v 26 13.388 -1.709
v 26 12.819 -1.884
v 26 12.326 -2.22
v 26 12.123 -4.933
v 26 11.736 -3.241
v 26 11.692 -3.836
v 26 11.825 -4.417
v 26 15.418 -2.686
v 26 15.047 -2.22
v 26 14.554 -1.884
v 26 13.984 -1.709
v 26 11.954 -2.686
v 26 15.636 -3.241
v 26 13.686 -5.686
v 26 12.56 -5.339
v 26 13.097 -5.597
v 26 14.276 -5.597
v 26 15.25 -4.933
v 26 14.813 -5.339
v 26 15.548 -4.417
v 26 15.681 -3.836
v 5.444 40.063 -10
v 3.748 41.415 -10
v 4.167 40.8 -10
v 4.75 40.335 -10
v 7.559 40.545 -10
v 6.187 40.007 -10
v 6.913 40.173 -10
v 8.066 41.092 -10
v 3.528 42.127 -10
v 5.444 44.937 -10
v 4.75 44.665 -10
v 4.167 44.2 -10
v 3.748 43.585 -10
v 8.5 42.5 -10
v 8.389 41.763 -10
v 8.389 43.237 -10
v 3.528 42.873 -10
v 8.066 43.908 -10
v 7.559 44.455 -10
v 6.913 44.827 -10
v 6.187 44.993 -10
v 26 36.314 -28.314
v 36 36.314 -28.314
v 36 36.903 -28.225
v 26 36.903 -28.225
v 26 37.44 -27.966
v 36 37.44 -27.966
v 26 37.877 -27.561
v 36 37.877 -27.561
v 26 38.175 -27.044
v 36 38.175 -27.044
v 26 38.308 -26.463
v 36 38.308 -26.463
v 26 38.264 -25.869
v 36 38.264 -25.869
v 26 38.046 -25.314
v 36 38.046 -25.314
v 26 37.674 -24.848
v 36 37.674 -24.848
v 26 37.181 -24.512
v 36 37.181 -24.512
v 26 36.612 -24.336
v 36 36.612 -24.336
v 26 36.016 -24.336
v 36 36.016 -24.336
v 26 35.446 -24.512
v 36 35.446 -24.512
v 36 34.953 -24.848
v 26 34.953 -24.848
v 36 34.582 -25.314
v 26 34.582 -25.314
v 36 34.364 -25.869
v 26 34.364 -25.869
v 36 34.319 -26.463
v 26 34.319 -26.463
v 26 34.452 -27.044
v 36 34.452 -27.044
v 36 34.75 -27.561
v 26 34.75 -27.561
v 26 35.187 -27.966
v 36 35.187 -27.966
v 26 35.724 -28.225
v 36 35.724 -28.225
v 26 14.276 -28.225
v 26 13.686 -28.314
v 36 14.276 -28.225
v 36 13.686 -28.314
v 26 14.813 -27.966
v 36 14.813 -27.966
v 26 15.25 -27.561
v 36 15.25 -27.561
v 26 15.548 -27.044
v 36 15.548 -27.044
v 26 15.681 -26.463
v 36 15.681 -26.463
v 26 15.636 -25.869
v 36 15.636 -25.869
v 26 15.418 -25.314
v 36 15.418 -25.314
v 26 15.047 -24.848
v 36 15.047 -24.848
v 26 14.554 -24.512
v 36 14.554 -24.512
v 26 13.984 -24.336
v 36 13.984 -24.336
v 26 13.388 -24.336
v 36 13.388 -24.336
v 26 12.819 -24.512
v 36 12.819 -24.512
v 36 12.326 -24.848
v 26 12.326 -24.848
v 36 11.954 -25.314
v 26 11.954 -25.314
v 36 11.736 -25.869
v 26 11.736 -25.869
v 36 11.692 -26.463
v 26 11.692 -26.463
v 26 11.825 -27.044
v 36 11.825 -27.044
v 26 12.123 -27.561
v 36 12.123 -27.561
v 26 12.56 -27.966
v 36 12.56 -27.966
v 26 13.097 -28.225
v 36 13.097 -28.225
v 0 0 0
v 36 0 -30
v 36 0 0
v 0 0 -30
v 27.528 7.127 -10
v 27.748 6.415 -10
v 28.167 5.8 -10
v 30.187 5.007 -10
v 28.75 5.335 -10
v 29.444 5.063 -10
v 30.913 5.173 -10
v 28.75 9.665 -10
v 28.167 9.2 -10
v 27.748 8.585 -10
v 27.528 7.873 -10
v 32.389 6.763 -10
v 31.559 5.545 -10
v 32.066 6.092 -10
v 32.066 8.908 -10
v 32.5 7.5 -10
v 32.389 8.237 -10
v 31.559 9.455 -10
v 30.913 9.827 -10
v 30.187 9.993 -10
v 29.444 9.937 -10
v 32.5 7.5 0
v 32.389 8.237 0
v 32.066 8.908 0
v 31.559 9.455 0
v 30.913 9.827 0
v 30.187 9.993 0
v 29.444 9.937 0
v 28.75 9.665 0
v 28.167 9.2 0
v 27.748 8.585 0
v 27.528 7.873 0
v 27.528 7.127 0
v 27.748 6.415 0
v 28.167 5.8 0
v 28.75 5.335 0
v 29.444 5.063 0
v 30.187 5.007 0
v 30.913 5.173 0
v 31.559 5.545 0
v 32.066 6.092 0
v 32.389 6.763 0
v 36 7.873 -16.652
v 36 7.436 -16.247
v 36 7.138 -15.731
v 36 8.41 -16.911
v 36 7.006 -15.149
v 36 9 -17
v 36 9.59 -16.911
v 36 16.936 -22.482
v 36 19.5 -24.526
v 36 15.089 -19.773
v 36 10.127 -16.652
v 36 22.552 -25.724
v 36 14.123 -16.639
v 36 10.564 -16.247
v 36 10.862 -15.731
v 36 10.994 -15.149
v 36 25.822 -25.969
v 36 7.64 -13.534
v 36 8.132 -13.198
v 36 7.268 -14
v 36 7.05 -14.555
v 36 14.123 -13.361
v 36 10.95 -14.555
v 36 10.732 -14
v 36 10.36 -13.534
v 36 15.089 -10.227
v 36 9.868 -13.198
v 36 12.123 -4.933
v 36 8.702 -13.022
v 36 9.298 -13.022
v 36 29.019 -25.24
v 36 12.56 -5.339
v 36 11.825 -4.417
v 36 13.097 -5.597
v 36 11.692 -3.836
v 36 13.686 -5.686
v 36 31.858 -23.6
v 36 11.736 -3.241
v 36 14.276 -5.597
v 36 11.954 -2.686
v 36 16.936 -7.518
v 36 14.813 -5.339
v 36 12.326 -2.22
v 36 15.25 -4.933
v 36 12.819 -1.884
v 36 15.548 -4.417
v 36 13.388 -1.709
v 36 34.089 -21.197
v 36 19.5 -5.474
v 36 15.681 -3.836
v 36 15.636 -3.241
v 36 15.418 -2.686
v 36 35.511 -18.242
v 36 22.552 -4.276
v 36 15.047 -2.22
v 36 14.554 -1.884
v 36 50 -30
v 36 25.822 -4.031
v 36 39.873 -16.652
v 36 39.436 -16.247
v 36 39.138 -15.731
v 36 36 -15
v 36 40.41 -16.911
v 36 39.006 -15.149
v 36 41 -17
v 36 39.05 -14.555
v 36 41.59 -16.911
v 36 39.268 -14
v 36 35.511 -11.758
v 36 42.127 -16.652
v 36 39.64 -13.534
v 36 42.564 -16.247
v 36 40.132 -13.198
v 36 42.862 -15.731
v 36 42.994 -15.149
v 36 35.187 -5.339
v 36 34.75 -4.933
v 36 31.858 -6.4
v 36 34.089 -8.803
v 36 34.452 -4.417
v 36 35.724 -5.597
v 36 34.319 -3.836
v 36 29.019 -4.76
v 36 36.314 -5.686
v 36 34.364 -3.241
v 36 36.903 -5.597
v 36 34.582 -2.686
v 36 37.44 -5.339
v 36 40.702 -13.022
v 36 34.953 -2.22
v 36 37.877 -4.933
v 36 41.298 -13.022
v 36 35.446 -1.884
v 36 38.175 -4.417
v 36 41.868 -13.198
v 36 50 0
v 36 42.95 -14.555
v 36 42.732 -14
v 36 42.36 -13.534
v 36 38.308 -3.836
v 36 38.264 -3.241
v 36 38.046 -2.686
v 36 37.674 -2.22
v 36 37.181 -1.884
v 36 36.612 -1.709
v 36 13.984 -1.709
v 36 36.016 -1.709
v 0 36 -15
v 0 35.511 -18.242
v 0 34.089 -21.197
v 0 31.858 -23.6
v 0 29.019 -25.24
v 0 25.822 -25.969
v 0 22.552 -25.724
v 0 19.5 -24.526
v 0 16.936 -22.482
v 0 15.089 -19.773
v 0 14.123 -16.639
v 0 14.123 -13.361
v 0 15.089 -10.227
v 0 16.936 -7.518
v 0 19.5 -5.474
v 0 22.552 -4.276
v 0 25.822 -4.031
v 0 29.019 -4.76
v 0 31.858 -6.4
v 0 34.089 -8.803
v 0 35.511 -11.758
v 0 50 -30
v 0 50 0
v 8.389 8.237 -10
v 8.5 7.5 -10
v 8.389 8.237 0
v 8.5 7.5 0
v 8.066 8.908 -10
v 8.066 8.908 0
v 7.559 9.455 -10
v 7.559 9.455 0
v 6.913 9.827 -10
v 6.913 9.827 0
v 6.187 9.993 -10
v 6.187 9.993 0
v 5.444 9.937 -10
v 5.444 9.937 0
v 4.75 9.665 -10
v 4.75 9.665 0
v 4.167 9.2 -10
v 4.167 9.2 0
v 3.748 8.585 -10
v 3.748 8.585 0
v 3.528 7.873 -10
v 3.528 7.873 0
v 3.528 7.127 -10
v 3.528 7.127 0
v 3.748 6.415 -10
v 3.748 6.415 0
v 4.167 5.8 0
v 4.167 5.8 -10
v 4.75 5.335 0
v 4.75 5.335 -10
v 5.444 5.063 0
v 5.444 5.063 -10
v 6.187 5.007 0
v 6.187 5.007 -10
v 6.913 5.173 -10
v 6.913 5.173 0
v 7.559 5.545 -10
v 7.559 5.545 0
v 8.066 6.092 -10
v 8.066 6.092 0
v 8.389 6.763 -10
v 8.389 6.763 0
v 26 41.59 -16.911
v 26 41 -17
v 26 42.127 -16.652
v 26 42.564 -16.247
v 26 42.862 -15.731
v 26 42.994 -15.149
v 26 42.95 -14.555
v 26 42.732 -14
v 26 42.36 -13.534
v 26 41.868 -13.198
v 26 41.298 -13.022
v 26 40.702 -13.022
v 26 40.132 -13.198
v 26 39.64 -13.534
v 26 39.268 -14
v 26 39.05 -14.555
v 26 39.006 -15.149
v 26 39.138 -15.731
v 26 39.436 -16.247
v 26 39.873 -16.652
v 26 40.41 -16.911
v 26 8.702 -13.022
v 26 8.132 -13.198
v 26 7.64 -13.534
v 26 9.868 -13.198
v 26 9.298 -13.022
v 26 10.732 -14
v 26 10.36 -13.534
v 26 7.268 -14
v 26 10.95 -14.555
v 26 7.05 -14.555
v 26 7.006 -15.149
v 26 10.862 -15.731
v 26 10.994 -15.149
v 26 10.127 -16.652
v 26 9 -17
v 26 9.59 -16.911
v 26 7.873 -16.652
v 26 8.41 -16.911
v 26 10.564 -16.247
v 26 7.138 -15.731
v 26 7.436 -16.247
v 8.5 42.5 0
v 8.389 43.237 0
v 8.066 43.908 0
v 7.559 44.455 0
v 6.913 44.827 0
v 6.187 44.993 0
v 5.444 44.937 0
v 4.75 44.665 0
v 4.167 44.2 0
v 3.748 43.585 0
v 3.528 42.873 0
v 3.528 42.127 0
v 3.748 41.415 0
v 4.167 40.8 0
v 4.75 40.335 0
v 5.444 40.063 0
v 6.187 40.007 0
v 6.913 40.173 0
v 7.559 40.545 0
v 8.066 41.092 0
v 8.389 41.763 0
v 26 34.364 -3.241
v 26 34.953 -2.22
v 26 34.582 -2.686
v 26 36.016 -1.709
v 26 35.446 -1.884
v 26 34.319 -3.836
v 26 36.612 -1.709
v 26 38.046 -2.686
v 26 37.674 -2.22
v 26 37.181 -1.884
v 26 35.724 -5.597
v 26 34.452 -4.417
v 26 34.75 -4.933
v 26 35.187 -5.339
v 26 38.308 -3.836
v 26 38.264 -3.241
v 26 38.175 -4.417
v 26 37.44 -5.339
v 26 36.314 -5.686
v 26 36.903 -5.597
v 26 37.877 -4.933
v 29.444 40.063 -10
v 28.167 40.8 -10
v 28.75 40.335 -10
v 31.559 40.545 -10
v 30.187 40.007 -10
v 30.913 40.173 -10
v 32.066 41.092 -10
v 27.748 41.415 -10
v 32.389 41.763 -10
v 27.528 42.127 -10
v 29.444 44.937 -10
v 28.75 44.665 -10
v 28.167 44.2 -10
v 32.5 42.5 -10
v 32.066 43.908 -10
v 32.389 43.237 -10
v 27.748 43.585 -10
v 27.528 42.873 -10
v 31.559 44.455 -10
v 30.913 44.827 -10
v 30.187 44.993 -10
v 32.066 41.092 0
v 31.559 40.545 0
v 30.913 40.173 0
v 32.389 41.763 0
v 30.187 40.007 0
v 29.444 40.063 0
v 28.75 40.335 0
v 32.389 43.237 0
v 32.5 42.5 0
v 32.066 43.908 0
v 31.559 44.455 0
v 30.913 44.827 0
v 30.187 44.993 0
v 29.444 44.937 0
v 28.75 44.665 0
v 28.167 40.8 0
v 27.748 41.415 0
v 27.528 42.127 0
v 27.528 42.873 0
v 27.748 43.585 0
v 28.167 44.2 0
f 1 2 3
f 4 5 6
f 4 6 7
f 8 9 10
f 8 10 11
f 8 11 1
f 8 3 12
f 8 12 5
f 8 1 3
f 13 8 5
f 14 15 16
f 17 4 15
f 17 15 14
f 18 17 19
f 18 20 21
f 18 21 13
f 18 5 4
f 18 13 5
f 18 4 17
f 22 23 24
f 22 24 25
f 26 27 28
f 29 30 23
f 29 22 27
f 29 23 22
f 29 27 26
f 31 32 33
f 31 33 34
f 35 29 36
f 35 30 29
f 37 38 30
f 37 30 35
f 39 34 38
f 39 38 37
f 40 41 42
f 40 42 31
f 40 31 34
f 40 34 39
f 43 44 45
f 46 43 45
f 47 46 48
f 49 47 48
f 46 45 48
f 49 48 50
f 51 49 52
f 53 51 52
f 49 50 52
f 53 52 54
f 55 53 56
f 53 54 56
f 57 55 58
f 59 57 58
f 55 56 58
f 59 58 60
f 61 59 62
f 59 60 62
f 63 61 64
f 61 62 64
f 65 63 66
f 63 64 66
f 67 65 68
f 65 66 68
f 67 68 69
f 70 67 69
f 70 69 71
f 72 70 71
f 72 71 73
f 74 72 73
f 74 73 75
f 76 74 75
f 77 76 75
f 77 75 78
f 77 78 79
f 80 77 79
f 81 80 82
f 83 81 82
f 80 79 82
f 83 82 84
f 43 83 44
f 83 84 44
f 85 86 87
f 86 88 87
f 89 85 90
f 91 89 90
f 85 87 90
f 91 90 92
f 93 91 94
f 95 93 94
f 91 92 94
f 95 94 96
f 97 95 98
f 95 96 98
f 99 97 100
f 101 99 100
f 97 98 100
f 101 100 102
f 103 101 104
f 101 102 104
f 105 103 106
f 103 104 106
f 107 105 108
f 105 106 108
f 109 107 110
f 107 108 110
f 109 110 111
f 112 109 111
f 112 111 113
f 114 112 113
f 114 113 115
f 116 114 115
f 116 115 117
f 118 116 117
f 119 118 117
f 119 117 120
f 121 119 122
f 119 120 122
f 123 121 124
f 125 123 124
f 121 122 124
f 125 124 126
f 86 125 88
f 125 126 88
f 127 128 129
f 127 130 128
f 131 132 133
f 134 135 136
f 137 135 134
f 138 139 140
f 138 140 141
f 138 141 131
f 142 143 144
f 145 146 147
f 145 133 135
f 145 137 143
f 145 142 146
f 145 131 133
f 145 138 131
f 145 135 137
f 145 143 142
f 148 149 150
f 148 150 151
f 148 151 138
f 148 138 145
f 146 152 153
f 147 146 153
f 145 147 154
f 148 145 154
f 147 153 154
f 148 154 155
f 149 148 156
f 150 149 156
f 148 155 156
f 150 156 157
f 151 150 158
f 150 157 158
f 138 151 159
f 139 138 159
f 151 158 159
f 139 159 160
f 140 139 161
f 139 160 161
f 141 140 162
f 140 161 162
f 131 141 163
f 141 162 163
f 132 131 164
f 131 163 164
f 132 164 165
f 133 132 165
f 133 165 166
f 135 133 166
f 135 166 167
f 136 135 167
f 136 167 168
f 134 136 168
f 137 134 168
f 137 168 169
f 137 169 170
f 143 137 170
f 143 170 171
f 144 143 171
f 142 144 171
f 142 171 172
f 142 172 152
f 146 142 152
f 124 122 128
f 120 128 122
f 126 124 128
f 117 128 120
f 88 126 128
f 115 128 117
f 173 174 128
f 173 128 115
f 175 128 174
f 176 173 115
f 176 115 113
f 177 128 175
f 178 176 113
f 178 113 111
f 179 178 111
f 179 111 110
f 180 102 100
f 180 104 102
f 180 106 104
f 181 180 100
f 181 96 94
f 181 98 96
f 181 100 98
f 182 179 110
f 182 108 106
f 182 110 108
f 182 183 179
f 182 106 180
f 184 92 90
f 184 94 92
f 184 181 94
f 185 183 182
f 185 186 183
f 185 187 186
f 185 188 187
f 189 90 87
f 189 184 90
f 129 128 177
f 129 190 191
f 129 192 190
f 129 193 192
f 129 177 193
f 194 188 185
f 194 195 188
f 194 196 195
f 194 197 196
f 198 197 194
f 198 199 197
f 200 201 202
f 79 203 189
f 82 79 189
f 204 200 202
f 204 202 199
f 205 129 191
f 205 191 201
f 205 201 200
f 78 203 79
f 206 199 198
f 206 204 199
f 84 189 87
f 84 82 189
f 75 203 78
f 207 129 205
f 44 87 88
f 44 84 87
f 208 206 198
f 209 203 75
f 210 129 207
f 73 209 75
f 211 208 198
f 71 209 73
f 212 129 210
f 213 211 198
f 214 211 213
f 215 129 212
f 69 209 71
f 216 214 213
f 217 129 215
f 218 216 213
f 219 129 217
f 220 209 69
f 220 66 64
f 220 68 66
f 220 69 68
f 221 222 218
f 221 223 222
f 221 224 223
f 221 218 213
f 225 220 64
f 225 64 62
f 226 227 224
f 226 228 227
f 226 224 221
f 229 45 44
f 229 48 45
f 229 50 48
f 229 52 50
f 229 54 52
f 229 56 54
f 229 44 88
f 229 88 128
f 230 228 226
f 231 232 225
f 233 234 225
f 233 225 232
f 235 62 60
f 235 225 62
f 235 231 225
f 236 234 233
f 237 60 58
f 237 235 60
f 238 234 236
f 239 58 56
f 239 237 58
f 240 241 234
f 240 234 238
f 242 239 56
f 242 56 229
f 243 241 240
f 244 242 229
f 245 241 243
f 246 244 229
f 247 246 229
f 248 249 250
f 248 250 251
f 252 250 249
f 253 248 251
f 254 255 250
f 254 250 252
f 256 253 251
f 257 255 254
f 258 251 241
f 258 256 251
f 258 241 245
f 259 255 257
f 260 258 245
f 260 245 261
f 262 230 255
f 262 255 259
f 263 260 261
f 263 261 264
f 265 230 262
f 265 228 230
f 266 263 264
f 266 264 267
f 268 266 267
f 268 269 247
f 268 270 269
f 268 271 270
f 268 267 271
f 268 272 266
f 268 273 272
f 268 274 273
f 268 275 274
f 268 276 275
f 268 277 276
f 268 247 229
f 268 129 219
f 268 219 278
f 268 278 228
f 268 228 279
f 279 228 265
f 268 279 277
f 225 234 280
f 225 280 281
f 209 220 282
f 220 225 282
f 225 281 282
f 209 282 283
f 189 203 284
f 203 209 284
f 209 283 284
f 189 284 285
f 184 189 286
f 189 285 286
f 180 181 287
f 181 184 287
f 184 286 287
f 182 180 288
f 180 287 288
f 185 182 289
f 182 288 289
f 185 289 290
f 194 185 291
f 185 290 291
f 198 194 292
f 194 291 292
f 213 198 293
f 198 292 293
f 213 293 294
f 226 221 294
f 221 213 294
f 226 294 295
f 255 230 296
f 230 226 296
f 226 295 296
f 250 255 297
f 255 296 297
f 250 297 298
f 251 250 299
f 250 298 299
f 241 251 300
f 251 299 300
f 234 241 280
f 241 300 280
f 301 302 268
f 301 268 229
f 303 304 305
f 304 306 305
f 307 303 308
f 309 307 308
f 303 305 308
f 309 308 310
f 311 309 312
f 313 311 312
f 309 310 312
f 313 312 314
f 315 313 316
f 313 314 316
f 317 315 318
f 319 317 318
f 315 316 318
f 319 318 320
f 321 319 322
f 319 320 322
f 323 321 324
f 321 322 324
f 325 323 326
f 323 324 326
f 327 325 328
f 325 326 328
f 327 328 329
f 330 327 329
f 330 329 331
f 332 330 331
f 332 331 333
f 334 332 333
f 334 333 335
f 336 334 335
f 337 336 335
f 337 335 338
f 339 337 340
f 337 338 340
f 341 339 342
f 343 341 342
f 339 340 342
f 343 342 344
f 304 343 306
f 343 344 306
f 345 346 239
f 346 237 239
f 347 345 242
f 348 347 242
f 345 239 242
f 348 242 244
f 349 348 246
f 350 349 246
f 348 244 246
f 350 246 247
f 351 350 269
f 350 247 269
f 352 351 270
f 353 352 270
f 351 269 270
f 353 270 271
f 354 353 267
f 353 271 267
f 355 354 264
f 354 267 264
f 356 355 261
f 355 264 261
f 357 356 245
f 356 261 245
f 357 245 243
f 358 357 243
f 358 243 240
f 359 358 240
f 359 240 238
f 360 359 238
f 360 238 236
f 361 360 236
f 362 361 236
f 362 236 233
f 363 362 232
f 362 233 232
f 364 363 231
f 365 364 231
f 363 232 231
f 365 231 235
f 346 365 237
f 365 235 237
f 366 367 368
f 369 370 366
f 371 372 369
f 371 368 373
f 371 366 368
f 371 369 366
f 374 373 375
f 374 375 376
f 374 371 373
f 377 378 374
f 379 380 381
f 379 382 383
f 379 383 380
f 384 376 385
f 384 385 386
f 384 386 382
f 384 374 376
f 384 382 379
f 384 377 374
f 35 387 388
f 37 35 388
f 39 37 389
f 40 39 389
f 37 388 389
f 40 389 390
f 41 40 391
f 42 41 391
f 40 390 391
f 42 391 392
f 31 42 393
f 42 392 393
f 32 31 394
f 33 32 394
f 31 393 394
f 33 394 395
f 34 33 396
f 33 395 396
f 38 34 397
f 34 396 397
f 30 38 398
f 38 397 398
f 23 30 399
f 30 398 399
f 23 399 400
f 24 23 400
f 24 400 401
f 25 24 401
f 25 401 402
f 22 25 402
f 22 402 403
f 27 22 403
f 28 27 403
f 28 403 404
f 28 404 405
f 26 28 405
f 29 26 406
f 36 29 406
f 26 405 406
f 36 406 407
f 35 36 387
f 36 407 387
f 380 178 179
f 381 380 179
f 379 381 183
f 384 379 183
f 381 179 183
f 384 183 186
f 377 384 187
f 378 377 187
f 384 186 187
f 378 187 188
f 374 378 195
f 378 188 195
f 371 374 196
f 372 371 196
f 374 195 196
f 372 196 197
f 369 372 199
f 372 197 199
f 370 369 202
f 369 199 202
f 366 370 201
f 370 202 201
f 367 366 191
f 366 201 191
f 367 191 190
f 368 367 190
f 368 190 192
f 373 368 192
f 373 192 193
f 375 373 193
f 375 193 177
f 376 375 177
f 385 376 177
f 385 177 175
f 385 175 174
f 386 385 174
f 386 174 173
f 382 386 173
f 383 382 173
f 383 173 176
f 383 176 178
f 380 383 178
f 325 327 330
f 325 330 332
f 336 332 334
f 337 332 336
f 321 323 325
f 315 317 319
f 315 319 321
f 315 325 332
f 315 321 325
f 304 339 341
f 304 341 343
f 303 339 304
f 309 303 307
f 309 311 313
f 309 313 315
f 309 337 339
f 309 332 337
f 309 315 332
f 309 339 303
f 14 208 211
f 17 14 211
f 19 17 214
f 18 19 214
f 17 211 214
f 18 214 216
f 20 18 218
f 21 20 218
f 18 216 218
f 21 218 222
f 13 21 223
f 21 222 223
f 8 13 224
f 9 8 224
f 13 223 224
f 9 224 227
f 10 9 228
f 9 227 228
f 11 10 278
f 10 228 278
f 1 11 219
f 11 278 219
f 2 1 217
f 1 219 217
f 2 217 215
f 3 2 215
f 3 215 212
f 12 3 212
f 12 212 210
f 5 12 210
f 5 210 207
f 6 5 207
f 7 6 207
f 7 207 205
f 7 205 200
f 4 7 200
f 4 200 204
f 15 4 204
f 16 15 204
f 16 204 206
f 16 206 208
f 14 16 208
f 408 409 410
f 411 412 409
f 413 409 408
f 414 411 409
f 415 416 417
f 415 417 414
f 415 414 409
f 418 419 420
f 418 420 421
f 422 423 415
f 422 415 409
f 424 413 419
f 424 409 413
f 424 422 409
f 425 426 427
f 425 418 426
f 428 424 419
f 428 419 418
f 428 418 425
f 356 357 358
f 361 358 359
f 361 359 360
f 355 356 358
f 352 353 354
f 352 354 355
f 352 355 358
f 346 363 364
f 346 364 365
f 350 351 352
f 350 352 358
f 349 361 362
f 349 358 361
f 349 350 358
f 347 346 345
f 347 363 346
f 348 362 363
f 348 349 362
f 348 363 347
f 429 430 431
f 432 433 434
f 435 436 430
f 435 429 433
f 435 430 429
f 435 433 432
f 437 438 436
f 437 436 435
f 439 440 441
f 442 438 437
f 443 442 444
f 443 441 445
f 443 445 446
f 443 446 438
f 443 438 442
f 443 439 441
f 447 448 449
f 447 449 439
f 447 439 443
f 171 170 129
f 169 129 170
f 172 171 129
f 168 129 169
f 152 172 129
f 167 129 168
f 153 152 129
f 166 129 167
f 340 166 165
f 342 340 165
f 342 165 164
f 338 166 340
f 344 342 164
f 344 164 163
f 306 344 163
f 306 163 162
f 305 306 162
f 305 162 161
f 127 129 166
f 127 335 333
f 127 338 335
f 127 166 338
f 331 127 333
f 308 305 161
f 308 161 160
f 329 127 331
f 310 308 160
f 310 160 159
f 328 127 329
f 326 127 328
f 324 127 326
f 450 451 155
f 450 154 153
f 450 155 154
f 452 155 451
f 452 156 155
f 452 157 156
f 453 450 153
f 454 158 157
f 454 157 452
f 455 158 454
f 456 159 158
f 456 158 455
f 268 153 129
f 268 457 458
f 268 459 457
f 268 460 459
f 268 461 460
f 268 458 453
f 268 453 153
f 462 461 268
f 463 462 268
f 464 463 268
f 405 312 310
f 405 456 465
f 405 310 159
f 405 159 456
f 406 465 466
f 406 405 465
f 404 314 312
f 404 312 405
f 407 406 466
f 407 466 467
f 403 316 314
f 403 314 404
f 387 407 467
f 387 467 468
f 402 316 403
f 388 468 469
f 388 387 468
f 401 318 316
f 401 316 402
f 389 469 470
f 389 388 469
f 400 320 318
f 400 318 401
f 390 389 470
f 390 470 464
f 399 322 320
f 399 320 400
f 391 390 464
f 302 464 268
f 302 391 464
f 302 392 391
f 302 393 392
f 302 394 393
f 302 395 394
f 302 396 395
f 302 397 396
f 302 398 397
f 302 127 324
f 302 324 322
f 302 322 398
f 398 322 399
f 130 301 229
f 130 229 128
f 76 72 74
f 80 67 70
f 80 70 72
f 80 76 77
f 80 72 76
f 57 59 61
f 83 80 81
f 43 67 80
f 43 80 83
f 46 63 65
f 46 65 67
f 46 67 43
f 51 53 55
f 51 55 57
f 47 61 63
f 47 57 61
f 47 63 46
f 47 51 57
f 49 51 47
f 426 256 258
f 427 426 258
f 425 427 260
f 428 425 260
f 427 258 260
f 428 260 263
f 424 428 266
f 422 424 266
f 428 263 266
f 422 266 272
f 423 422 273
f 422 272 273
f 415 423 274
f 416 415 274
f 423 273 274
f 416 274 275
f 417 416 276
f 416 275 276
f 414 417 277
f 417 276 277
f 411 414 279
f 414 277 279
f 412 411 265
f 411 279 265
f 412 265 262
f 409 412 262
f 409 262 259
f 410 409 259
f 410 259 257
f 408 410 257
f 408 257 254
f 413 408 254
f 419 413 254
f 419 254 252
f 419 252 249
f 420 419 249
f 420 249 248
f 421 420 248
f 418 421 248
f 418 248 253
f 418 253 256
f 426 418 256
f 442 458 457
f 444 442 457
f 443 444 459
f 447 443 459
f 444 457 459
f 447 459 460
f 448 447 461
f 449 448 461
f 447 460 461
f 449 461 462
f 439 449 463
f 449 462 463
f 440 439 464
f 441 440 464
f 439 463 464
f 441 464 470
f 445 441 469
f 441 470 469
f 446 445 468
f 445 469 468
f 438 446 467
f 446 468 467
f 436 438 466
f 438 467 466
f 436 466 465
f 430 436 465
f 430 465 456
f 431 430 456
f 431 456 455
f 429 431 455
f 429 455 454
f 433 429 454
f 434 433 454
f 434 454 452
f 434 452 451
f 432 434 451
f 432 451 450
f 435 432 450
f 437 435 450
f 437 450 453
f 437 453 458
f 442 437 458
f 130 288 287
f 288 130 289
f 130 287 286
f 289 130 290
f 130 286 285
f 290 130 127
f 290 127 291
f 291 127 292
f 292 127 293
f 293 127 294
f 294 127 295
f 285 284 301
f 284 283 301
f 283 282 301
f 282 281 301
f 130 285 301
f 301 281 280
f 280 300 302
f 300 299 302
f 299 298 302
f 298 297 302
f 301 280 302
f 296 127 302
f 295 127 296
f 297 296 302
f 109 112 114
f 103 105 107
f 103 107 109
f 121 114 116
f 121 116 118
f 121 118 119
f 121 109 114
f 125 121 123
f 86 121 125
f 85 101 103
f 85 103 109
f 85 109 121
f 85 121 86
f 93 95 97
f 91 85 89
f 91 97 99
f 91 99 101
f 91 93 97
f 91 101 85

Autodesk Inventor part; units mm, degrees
ref_plane "YZ Plane" through (0, 0, 0) normal (1, 0, 0) x (0, 1, 0)
ref_plane "XZ Plane" through (0, 0, 0) normal (0, 1, 0) x (-1, 0, 0)
ref_plane "XY Plane" through (0, 0, 0) normal (0, 0, 1) x (1, 0, 0)
sketch "Sketch1" plane through (0, 0, 0) normal (1, 0, 0) x (0, 1, 0)
  line L0 (0, 0) -> (50, 0)
  line L1 (50, 0) -> (50, -30)
  line L2 (50, -30) -> (0, -30)
  line L3 (0, -30) -> (0, 0)
  line L4 (50, 0) -> (0, -30) construction
  line L5 (0, 0) -> (50, -30) construction
  circle A0 centre (25, -15) radius 11
  dimension "d0" = 30
  dimension "d1" = 50
  dimension "d2" = 22
extrude "Extrusion1" add sketch "Sketch1" along normal blind 36
sketch "Sketch2" plane through (36, 0, 0) normal (1, 0, 0) x (0, 0, -1)
  circle A0 centre (15, 25) radius 11 projected
  circle A1 centre (15, 25) radius 16 construction
  circle A2 centre (15, 41) radius 2
  circle A3 centre (3.6863, 36.3137) radius 2
  circle A4 centre (-1, 25) radius 2
  circle A5 centre (3.6863, 13.6863) radius 2
  circle A6 centre (15, 9) radius 2
  circle A7 centre (26.3137, 13.6863) radius 2
  circle A8 centre (31, 25) radius 2
  circle A9 centre (26.3137, 36.3137) radius 2
  point P0 (0, 0)
  dimension "d5" = 32
  dimension "d6" = 4
  dimension "d9" = 360
extrude "Extrusion2" cut sketch "Sketch2" against normal blind 10 contours A2 | A3 | A5 | A6 | A7 | A9
sketch "Sketch3" plane through (0, 0, 0) normal (0, 0, 1) x (1, 0, 0)
  circle A0 centre (6, 42.5) radius 2.5
  circle A1 centre (30, 42.5) radius 2.5
  circle A2 centre (6, 7.5) radius 2.5
  circle A3 centre (30, 7.5) radius 2.5
  line L0 (30, 42.5) -> (30, 7.5) construction
  line L1 (36, 50) -> (36, 0) projected
  point P0 (0, 0)
  point P1 (30, 25)
  point P2 (36, 25)
  dimension "d13" = 5
  dimension "d14" = 6
  dimension "d16" = 24
  dimension "d17" = 35
extrude "Extrusion3" cut sketch "Sketch3" against normal blind 10
ref_plane "Work Plane1" through (18, 0, 0) normal (1, 0, 0) x (0, 0, -1)
properties part number "DSG12H - TO_MS_SPEC"
